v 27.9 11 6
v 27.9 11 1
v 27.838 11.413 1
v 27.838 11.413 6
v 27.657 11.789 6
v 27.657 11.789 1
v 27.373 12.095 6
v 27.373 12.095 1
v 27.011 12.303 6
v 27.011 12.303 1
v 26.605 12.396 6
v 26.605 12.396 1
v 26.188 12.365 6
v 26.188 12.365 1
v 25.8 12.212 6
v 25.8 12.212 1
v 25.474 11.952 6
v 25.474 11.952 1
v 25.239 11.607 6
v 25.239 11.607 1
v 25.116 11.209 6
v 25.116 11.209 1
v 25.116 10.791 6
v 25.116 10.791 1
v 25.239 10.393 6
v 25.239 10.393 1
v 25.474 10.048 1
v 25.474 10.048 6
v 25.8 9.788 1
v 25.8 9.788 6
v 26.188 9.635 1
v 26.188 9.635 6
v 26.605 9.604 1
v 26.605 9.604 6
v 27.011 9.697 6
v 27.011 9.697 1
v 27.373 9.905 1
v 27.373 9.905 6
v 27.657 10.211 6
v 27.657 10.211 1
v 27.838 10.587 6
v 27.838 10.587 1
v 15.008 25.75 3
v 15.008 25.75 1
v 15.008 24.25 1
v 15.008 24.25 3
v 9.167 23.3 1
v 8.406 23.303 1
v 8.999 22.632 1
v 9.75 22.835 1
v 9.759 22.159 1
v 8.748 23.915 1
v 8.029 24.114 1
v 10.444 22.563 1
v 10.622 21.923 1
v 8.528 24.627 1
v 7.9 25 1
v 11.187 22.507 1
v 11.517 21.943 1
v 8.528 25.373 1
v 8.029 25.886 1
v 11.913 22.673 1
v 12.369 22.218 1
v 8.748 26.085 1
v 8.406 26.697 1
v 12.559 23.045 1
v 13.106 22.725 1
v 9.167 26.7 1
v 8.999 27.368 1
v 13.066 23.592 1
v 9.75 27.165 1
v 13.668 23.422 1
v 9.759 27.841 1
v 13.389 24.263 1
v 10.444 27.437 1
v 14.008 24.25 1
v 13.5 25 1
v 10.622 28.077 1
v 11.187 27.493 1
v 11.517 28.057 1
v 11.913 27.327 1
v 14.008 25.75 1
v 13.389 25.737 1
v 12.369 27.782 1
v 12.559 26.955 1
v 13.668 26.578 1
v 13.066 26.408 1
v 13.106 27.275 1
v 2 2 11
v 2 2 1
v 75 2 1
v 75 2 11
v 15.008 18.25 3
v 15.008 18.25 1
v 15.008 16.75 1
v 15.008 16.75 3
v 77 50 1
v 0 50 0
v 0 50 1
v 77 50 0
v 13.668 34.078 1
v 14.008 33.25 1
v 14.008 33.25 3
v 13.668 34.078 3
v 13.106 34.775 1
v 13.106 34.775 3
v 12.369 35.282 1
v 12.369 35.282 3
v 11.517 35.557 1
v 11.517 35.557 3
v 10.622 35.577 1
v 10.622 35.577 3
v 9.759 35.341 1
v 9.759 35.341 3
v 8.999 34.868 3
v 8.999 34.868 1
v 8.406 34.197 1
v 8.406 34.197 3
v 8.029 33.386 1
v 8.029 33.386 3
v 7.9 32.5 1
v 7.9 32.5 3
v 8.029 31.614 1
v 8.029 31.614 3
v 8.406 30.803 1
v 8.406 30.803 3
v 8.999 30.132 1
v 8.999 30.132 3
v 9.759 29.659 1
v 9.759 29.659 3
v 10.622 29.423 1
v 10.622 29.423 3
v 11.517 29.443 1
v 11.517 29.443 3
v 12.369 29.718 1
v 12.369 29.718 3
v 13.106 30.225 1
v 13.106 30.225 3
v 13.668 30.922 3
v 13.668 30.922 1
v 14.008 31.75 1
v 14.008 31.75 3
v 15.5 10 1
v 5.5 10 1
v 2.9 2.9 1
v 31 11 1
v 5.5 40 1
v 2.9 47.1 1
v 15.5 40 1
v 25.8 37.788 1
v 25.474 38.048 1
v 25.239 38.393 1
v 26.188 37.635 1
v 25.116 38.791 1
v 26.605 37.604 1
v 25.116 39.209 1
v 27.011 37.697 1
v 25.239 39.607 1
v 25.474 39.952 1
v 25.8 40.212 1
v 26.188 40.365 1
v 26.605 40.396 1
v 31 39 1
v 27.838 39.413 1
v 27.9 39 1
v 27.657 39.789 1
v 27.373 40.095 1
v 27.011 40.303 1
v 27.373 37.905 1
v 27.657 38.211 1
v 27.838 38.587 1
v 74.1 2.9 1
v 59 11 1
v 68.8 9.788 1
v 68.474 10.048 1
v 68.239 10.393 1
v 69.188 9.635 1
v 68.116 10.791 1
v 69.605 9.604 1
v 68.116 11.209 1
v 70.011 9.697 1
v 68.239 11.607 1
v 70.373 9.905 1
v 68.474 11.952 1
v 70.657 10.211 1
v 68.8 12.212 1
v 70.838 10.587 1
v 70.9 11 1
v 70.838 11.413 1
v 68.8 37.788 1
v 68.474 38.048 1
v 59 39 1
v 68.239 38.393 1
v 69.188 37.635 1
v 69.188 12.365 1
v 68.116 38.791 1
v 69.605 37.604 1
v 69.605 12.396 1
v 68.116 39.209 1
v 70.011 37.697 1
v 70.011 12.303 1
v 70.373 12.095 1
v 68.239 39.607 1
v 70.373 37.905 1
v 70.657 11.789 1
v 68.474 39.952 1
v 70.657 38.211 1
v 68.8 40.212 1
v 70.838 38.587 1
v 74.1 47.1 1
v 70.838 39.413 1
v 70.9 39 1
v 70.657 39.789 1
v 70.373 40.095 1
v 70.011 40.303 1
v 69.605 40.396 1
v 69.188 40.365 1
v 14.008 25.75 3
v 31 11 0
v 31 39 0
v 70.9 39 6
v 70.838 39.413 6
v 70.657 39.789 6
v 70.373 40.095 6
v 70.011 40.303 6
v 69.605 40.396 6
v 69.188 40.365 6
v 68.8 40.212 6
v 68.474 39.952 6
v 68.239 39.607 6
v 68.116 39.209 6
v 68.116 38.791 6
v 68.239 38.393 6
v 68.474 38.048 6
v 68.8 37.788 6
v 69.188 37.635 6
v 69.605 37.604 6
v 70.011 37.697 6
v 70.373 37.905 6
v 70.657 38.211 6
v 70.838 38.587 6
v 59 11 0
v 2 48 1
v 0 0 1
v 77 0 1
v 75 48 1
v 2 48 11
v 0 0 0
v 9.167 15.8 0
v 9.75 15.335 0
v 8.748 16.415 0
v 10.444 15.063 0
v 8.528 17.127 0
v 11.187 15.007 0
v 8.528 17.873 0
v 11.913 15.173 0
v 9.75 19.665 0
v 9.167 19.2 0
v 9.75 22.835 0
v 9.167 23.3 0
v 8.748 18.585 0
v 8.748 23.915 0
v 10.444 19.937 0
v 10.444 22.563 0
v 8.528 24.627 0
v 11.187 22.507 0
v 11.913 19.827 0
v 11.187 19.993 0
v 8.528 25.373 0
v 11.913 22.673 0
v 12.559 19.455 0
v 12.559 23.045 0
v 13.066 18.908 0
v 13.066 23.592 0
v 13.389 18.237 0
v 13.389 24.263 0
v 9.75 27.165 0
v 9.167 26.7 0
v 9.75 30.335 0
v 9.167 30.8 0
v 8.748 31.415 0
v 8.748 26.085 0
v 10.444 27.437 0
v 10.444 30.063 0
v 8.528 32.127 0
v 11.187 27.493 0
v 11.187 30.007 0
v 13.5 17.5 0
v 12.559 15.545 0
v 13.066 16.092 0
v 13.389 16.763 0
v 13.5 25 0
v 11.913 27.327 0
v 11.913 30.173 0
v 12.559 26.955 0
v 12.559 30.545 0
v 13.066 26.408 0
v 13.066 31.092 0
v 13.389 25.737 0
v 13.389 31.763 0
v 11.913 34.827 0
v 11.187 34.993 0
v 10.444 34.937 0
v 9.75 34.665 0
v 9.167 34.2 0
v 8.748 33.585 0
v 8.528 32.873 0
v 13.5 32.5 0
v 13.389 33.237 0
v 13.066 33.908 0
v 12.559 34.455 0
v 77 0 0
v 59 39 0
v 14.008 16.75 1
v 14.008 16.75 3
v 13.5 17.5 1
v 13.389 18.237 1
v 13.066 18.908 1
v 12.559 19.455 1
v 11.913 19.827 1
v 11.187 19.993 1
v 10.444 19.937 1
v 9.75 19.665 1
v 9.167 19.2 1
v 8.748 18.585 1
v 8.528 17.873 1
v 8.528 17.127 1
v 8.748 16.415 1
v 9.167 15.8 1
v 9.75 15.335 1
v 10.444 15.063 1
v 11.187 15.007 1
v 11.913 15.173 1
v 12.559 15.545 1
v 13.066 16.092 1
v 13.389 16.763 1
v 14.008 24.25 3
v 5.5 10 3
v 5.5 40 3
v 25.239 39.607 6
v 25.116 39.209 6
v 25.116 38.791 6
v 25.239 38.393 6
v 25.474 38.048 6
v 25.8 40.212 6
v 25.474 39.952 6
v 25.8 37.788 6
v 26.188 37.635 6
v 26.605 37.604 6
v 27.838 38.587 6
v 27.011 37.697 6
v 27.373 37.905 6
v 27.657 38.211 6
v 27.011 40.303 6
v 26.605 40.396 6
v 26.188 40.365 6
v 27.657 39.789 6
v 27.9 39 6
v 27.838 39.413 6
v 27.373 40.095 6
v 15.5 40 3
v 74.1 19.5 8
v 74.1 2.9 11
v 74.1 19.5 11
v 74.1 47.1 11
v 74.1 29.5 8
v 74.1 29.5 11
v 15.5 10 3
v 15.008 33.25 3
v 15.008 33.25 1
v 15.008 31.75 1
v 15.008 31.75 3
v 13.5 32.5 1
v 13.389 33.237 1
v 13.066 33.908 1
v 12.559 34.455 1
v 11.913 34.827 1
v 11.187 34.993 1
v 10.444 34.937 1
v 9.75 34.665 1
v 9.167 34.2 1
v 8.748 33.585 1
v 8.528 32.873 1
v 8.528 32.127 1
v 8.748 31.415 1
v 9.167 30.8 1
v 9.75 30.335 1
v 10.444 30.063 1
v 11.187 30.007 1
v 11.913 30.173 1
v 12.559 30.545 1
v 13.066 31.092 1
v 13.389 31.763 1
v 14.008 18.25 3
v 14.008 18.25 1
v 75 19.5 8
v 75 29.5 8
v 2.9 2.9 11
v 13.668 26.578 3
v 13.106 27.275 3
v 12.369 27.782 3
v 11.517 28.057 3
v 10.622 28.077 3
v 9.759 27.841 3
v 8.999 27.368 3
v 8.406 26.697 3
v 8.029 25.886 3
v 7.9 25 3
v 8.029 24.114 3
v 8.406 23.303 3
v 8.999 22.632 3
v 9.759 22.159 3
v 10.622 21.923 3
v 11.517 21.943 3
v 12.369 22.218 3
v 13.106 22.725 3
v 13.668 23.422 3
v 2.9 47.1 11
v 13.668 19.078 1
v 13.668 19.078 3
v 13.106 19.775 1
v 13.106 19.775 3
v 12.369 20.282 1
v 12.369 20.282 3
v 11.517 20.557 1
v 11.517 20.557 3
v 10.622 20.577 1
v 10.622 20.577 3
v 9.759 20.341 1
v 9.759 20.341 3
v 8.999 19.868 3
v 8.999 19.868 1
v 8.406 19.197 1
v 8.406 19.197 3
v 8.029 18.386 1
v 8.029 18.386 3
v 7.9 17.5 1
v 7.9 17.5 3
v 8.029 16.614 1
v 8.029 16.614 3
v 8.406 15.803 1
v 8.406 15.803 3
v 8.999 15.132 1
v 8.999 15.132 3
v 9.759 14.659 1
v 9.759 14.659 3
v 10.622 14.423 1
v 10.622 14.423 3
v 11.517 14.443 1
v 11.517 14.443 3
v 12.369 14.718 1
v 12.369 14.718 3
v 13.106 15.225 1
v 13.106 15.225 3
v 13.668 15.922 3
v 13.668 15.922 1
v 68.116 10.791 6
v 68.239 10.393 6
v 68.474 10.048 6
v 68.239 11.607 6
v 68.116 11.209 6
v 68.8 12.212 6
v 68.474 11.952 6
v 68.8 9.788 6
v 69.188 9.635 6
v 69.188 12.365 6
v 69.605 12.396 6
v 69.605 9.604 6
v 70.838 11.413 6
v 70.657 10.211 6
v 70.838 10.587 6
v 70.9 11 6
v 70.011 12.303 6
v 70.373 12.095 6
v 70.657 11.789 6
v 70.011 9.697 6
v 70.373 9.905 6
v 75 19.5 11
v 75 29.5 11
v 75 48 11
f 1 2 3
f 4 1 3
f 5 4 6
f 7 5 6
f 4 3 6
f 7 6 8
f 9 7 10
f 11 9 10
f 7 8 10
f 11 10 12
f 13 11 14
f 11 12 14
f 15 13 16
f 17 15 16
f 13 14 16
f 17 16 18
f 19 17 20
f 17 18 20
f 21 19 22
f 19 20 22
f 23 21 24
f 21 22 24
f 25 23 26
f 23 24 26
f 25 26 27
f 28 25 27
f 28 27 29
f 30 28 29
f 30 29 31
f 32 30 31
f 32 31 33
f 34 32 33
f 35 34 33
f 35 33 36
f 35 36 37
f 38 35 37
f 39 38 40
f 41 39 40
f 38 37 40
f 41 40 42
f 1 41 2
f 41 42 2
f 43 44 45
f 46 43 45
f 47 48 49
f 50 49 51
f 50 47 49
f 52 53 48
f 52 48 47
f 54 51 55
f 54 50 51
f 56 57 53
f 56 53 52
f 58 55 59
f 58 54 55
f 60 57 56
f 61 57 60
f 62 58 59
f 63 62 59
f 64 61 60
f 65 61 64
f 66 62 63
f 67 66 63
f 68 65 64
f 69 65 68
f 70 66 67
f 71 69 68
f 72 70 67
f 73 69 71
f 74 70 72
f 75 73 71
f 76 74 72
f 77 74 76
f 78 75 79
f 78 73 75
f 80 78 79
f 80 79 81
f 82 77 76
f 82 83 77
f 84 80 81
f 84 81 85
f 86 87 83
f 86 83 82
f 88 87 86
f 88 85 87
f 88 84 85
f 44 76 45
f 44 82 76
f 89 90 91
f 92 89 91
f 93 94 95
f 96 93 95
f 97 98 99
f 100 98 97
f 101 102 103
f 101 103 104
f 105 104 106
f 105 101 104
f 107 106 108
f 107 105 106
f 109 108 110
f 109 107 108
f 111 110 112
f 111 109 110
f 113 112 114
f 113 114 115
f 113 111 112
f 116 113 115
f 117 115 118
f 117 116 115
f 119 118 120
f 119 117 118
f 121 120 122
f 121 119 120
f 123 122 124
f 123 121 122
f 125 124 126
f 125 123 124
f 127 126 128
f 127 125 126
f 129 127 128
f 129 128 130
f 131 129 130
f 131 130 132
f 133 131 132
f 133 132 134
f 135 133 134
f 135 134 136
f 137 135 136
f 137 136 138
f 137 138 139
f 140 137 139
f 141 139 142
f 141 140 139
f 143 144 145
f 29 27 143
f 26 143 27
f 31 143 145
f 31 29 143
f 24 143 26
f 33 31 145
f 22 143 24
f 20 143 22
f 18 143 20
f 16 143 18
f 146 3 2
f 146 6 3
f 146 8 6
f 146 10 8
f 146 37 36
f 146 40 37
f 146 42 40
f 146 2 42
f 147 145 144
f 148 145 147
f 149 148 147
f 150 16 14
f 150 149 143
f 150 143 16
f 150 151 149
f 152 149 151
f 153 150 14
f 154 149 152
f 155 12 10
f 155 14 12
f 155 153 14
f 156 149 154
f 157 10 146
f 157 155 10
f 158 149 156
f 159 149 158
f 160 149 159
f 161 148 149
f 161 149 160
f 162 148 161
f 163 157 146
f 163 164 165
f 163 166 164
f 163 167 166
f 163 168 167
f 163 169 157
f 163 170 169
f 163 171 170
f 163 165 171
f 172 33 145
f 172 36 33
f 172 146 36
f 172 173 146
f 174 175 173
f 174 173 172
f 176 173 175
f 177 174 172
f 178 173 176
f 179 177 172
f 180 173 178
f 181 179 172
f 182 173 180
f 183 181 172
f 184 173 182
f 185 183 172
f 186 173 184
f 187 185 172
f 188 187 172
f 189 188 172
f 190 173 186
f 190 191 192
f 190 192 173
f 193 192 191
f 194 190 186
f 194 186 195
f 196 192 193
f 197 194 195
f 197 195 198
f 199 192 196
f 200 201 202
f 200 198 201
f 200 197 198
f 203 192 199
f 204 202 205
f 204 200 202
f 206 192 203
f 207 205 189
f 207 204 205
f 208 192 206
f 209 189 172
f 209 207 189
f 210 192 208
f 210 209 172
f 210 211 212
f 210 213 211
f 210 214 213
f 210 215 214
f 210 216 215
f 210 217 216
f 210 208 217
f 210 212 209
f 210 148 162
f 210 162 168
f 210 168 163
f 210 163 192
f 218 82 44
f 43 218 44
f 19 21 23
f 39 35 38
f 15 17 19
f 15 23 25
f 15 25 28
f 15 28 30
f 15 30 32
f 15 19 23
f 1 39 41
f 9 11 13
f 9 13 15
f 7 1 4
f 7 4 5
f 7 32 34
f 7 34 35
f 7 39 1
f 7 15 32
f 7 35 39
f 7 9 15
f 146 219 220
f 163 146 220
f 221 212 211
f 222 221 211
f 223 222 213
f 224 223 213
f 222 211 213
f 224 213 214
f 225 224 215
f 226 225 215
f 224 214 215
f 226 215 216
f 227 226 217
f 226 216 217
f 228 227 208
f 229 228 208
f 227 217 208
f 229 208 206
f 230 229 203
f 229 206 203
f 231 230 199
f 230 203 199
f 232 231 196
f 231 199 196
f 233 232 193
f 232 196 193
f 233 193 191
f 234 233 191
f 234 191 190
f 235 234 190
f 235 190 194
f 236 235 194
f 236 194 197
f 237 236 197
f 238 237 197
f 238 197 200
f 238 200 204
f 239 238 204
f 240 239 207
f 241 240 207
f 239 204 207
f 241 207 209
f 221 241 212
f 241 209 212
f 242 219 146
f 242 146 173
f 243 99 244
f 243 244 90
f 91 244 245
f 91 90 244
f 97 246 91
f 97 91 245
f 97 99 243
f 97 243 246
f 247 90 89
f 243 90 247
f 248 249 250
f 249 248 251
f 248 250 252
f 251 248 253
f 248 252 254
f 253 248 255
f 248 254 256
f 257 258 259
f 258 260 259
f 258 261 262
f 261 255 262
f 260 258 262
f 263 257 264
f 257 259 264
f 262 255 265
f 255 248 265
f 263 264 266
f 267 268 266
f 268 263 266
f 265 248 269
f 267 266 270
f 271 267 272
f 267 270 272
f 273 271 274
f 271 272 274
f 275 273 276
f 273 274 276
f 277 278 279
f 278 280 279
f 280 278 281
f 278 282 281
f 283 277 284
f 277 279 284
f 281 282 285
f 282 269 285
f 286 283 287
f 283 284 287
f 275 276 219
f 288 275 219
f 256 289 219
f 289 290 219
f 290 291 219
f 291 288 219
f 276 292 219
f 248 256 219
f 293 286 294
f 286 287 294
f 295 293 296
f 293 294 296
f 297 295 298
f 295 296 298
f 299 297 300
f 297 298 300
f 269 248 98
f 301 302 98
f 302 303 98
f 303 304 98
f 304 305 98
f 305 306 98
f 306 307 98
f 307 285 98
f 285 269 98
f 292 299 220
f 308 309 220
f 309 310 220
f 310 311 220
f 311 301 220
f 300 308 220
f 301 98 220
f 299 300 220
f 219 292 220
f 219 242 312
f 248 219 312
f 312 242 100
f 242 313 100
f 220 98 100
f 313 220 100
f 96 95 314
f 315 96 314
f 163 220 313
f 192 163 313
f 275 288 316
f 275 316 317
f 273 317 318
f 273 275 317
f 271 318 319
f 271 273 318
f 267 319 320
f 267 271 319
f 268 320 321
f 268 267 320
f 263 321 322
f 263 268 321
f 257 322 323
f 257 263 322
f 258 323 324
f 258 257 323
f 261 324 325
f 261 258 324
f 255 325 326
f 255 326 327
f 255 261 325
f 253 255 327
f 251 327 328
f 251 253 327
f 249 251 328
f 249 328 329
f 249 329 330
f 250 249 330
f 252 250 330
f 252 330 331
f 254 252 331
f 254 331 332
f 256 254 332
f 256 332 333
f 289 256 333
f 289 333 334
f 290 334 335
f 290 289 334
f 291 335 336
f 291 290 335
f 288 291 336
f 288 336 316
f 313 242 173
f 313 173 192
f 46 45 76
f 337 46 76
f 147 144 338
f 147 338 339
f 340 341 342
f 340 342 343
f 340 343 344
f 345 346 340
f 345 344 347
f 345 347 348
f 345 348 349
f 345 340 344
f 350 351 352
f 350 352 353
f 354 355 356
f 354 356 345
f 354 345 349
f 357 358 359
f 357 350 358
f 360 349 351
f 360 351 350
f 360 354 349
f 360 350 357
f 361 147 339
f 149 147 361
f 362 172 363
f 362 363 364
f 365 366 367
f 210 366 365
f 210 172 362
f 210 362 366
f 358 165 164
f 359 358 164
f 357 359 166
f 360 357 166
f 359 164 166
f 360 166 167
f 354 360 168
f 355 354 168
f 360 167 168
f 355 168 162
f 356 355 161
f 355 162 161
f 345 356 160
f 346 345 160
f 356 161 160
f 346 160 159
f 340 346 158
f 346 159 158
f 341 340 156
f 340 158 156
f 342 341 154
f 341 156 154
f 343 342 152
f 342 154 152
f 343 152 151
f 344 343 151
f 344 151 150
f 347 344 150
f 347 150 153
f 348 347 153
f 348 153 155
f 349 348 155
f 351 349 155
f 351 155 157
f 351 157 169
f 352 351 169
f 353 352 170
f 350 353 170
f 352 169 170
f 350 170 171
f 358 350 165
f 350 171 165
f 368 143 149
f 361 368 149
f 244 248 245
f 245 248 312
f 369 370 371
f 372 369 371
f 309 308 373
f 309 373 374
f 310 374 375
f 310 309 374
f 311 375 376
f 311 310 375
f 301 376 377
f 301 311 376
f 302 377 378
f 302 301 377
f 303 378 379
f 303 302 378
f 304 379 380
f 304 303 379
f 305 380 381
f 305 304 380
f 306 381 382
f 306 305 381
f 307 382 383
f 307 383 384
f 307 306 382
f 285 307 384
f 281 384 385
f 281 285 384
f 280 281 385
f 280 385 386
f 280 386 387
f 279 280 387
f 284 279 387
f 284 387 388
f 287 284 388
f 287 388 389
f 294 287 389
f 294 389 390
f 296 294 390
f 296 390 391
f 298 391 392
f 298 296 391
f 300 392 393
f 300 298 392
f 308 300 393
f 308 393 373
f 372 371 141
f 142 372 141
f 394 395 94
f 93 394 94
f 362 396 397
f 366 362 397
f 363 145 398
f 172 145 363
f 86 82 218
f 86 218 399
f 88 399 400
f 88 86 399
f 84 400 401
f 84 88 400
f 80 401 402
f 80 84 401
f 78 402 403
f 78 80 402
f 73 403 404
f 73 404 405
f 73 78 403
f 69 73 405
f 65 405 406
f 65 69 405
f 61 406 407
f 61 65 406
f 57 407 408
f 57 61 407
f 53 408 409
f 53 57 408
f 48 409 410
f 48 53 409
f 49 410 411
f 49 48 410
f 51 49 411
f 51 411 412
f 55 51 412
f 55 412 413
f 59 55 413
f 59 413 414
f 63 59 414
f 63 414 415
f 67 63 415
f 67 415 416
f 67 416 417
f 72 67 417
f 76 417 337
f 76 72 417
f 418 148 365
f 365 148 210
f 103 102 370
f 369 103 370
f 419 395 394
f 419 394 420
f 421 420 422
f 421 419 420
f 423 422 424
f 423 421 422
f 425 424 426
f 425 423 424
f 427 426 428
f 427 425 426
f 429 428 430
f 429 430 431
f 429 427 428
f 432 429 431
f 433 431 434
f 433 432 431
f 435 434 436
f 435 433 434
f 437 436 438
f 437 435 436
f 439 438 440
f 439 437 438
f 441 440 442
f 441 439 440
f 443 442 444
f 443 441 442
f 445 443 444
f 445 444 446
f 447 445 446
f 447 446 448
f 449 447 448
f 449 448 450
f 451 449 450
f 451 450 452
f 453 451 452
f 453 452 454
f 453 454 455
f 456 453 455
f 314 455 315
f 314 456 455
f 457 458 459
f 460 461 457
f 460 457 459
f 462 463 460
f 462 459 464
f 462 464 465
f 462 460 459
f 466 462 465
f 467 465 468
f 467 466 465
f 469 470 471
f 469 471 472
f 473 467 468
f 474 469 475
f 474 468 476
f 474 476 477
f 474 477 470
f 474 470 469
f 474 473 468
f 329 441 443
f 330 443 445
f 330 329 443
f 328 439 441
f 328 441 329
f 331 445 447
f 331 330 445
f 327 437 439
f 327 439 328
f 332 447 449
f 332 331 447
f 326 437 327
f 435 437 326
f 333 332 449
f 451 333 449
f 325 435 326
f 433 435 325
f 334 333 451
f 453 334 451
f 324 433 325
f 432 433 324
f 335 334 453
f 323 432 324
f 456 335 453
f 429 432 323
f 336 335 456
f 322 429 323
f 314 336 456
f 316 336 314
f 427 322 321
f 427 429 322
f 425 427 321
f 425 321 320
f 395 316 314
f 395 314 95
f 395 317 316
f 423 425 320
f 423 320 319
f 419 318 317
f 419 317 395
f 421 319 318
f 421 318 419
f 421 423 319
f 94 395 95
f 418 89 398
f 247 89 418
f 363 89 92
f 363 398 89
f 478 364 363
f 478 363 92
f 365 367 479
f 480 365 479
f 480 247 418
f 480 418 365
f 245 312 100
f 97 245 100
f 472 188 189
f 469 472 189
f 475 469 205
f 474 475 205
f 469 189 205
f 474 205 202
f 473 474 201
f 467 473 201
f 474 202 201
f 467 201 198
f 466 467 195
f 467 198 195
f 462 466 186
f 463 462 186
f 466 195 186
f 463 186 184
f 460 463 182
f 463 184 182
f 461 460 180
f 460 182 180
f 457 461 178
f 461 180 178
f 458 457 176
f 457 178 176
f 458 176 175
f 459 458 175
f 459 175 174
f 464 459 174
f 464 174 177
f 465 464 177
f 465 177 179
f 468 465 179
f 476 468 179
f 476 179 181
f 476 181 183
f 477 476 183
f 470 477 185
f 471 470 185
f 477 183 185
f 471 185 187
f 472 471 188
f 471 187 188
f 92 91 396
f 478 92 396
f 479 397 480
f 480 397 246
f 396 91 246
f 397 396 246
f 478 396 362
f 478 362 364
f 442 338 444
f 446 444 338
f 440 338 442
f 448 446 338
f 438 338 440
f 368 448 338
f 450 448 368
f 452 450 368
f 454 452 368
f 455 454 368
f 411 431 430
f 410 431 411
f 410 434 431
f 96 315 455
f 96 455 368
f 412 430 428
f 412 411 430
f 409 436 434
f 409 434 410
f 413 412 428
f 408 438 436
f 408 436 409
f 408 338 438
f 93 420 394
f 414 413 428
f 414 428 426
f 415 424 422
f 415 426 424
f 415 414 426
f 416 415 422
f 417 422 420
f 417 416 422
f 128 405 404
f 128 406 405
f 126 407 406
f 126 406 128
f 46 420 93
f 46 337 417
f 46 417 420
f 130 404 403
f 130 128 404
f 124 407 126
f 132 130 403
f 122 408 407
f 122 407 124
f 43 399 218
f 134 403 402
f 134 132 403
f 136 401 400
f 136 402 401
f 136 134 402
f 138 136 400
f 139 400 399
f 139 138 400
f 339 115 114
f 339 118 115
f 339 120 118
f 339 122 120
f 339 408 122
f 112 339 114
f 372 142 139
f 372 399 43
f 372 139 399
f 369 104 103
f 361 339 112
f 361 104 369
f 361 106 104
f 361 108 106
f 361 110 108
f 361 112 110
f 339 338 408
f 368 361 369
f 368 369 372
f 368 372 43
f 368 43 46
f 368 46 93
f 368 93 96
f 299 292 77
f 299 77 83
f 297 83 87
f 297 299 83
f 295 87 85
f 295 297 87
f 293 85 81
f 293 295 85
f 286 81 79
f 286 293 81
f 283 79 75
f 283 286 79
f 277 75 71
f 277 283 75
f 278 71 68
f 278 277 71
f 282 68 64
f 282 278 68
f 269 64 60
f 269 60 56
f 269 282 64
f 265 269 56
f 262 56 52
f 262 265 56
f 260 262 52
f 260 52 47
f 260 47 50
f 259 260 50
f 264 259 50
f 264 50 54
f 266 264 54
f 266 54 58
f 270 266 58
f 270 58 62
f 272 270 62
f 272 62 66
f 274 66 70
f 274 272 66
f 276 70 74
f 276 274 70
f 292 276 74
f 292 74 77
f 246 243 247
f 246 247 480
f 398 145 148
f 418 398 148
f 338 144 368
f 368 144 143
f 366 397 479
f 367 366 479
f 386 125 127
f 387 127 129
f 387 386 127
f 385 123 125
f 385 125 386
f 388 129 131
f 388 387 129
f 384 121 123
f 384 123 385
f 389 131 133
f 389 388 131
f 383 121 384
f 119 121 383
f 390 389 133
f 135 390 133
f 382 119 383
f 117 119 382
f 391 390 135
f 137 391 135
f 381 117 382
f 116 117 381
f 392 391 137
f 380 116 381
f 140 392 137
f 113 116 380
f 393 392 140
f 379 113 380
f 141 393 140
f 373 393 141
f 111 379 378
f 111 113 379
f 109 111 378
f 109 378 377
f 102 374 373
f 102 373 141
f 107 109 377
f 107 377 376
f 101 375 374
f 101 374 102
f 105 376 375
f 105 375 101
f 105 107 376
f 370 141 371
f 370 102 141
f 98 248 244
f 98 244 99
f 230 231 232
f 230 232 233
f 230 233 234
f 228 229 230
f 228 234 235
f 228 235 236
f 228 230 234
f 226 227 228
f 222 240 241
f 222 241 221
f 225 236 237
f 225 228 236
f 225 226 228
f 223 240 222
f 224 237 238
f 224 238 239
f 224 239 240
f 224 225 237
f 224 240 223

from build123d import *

# Parameters (mm, degrees)
SKETCH028_W     = 77
SKETCH028_H     = 50
SKETCH028_R     = 2.5
SKETCH028_W_2   = 28
SKETCH028_H_2   = 28
PAD018_DEPTH    = 1
SKETCH029_R     = 1.4
PAD019_DEPTH    = 5
SKETCH030_W     = 73
SKETCH030_H     = 46
SKETCH030_W_2   = 71.2
SKETCH030_H_2   = 44.2
PAD020_DEPTH    = 10
SKETCH031_W     = 10
SKETCH031_H     = 3
POCKET004_DEPTH = 5
SKETCH032_W     = 10
SKETCH032_H     = 30
PAD021_DEPTH    = 2


with BuildPart() as part:
    # Sketch028 → Pad018 (new body)
    with BuildSketch(Plane.XY):
        with Locations((38.5, 25)):
            Rectangle(SKETCH028_W, SKETCH028_H)
        with Locations((11, 32.5)):
            Circle(SKETCH028_R, mode=Mode.SUBTRACT)
        with Locations((11, 25)):
            Circle(SKETCH028_R, mode=Mode.SUBTRACT)
        with Locations((11, 17.5)):
            Circle(SKETCH028_R, mode=Mode.SUBTRACT)
        with Locations((45, 25)):
            Rectangle(SKETCH028_W_2, SKETCH028_H_2, mode=Mode.SUBTRACT)
    extrude(amount=PAD018_DEPTH)

    # Sketch029 → Pad019 (join)
    with BuildSketch(Plane.XY.offset(1)):
        with Locations((26.5, 39)):
            Circle(SKETCH029_R)
        with Locations((69.5, 39)):
            Circle(SKETCH029_R)
        with Locations((69.5, 11)):
            Circle(SKETCH029_R)
        with Locations((26.5, 11)):
            Circle(SKETCH029_R)
    extrude(amount=PAD019_DEPTH)

    # Sketch030 → Pad020 (join)
    with BuildSketch(Plane.XY.offset(1)):
        with Locations((38.5, 25)):
            Rectangle(SKETCH030_W, SKETCH030_H)
        with Locations((38.5, 25)):
            Rectangle(SKETCH030_W_2, SKETCH030_H_2, mode=Mode.SUBTRACT)
    extrude(amount=PAD020_DEPTH)

    # Sketch031 (on Face16 of Pad020) → Pocket004 (cut)
    with BuildSketch(Plane.YZ.offset(75)):
        with Locations((24.5, 9.5)):
            Rectangle(SKETCH031_W, SKETCH031_H)
    extrude(amount=-POCKET004_DEPTH, mode=Mode.SUBTRACT)

    # Sketch032 (on Face18 of Pocket004) → Pad021 (join)
    with BuildSketch(Plane.XY.offset(1)):
        with Locations((10.5, 25)):
            Rectangle(SKETCH032_W, SKETCH032_H)
        with BuildLine():
            ThreePointArc((14.007906, 33.25), (7.9, 32.5), (14.007906, 31.75))
            Line((15.007906, 31.75), (14.007906, 31.75))
            Line((15.007906, 33.25), (15.007906, 31.75))
            Line((14.007906, 33.25), (15.007906, 33.25))
        make_face(mode=Mode.SUBTRACT)
        with BuildLine():
            ThreePointArc((14.007906, 25.75), (7.9, 25), (14.007906, 24.25))
            Line((15.007906, 24.25), (14.007906, 24.25))
            Line((15.007906, 25.75), (15.007906, 24.25))
            Line((14.007906, 25.75), (15.007906, 25.75))
        make_face(mode=Mode.SUBTRACT)
        with BuildLine():
            ThreePointArc((14.007906, 18.25), (7.9, 17.5), (14.007906, 16.75))
            Line((15.007906, 16.75), (14.007906, 16.75))
            Line((15.007906, 18.25), (15.007906, 16.75))
            Line((14.007906, 18.25), (15.007906, 18.25))
        make_face(mode=Mode.SUBTRACT)
    extrude(amount=PAD021_DEPTH)


solid = part.part
